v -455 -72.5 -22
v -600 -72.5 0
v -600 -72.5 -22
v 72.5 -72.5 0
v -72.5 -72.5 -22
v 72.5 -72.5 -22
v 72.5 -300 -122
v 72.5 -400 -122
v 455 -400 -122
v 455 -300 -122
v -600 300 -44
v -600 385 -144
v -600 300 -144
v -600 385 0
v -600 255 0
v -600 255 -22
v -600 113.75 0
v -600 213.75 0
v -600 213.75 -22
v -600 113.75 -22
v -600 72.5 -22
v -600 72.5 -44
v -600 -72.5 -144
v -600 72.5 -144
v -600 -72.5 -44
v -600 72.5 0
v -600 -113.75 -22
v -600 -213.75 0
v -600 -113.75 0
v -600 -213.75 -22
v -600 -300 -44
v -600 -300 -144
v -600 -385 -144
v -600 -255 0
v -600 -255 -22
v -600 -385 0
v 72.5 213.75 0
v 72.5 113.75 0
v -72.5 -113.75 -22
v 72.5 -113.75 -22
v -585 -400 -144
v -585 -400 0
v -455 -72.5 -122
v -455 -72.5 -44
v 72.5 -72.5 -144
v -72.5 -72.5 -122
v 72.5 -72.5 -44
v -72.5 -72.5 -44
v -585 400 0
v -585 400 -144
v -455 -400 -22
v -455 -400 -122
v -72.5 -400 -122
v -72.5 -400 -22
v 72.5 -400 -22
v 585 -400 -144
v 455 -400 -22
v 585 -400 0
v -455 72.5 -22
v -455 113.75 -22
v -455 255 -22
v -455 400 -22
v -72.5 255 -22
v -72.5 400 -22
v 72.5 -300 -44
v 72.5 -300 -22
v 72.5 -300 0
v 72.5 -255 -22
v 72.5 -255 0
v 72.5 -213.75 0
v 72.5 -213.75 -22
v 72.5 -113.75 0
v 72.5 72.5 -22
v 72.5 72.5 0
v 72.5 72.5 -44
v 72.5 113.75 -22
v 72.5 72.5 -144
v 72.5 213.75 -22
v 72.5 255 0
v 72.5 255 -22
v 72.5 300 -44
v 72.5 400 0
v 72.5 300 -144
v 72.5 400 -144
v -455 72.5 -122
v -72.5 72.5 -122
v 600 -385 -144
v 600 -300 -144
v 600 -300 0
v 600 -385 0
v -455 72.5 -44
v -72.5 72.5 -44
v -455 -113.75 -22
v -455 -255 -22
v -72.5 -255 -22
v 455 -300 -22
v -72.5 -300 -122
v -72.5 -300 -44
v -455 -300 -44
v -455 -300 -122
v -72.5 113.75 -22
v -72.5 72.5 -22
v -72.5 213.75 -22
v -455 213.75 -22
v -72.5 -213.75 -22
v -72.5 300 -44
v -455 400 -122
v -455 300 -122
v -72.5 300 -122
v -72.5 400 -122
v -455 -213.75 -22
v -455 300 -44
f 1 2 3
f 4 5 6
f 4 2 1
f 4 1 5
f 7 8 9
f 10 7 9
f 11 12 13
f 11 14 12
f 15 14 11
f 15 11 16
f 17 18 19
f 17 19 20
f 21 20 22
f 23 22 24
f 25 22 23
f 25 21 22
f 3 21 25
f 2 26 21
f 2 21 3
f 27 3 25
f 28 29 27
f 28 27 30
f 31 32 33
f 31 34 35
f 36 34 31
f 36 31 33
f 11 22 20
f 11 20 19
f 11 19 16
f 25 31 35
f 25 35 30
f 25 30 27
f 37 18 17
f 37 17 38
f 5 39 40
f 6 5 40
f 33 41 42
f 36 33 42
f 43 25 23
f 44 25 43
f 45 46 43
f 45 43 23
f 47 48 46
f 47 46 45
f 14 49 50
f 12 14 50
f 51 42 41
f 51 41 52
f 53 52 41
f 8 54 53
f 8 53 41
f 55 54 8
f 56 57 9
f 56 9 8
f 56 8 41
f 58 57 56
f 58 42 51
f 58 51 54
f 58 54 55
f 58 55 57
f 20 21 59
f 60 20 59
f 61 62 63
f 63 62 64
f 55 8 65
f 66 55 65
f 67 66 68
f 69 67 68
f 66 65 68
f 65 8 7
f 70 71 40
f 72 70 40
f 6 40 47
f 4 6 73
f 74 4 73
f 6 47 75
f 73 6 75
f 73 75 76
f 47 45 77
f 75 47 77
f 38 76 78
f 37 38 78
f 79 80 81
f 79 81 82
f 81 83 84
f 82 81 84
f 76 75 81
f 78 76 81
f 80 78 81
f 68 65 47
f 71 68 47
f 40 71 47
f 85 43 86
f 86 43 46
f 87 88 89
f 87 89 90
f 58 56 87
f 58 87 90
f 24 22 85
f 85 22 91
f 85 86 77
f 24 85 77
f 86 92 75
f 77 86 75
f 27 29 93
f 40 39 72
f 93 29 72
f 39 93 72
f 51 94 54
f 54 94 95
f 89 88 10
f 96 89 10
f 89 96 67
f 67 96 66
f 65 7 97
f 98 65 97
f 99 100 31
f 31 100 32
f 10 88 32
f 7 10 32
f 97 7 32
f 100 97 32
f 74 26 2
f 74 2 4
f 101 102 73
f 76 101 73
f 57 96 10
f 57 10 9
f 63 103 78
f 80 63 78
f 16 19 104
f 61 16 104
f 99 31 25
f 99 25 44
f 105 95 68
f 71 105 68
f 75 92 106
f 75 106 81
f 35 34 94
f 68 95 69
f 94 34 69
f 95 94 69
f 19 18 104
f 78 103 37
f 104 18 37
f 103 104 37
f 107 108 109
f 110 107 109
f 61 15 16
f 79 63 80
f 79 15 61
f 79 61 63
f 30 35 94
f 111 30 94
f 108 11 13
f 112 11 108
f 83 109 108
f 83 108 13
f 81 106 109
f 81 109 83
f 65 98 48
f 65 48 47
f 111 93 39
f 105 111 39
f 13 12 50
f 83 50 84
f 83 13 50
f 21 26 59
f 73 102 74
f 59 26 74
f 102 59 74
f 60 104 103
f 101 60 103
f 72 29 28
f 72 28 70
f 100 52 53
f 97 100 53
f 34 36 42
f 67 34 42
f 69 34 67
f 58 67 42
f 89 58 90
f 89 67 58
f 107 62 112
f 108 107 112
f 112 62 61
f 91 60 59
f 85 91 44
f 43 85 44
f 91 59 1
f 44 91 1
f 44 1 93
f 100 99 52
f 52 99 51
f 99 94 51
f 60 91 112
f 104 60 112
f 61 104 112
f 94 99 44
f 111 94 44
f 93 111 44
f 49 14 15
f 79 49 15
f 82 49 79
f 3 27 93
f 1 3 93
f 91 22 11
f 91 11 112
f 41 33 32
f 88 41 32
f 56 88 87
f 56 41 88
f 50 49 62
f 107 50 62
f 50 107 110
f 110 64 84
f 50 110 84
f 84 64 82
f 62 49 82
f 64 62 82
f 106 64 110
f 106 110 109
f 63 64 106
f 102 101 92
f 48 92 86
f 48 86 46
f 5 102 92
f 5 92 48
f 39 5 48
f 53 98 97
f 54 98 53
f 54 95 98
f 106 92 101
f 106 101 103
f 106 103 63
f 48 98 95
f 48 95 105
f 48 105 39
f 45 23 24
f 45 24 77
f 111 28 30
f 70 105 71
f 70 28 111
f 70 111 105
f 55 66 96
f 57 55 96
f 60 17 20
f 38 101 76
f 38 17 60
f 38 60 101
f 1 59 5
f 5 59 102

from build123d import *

# Parameters (mm, degrees)
F0_W      = 1200
F0_H      = 145
F1_DEPTH  = 22
F0_H_2    = 100
F2_W      = 145
F2_H      = 655
F2_H_2    = 145
F3_DEPTH  = 22
F4_W      = 145
F4_H      = 100
F6_DEPTH  = 78
F4_H_2    = 145
F5_W      = 145
F5_H      = 145
F5_H_2    = 100
F7_W      = 145
F7_H      = 100
F7_W_2    = 1055
F8_DEPTH  = 22
F7_W_3    = 1200
F7_H_2    = 145
F10_SIZE  = 15
F11_W     = 527.5
F11_H     = 145
F12_DEPTH = 211


# Not quite as in the source:
# - a feature names something its author has since deleted; it is built from what else it names


with BuildPart() as f1:
    # F0 (on Top) → F1 (new body)
    with BuildSketch(Plane.XY):
        with Locations((0, 327.5)):
            Rectangle(F0_W, F0_H)
    extrude(amount=-F1_DEPTH)


with BuildPart() as f1b:
    # F0 (on Top) → F1, piece 2 (new body)
    with BuildSketch(Plane.XY):
        with Locations((0, 163.75)):
            Rectangle(F0_W, F0_H_2)
    extrude(amount=-F1_DEPTH)


with BuildPart() as f1c:
    # F0 (on Top) → F1, piece 3 (new body)
    with BuildSketch(Plane.XY):
        Rectangle(F0_W, F0_H)
    extrude(amount=-F1_DEPTH)


with BuildPart() as f1d:
    # F0 (on Top) → F1, piece 4 (new body)
    with BuildSketch(Plane.XY):
        with Locations((0, -163.75)):
            Rectangle(F0_W, F0_H_2)
    extrude(amount=-F1_DEPTH)


with BuildPart() as f1e:
    # F0 (on Top) → F1, piece 5 (new body)
    with BuildSketch(Plane.XY):
        with Locations((0, -327.5)):
            Rectangle(F0_W, F0_H)
    extrude(amount=-F1_DEPTH)


with BuildPart() as f3:
    # F2 (on face) → F3 (new body)
    with BuildSketch(Plane(origin=(0, 0, -22), x_dir=(1, 0, 0), z_dir=(0, 0, -1))):
        with Locations((-527.5, -72.5)):
            Rectangle(F2_W, F2_H)
        with Locations((-527.5, 327.5)):
            Rectangle(F2_W, F2_H_2)
    extrude(amount=F3_DEPTH)


with BuildPart() as f3b:
    # F2 (on face) → F3, piece 2 (new body)
    with BuildSketch(Plane(origin=(0, 0, -22), x_dir=(1, 0, 0), z_dir=(0, 0, -1))):
        with Locations((0, 327.5)):
            Rectangle(F2_W, F2_H_2)
        with Locations((0, -72.5)):
            Rectangle(F2_W, F2_H)
    extrude(amount=F3_DEPTH)


with BuildPart() as f3c:
    # F2 (on face) → F3, piece 3 (new body)
    with BuildSketch(Plane(origin=(0, 0, -22), x_dir=(1, 0, 0), z_dir=(0, 0, -1))):
        with Locations((527.5, 327.5)):
            Rectangle(F2_W, F2_H_2)
        with Locations((527.5, -72.5)):
            Rectangle(F2_W, F2_H)
    extrude(amount=F3_DEPTH)


with BuildPart() as f6:
    # F4 (on face) → F6 (new body)
    with BuildSketch(Plane(origin=(0, 0, -44), x_dir=(1, 0, 0), z_dir=(0, 0, -1))):
        with Locations((-527.5, -350)):
            Rectangle(F4_W, F4_H)
    extrude(amount=F6_DEPTH)


with BuildPart() as f6b:
    # F4 (on face) → F6, piece 2 (new body)
    with BuildSketch(Plane(origin=(0, 0, -44), x_dir=(1, 0, 0), z_dir=(0, 0, -1))):
        with Locations((-527.5, 350)):
            Rectangle(F4_W, F4_H)
    extrude(amount=F6_DEPTH)


with BuildPart() as f6c:
    # F4 (on face) → F6, piece 3 (new body)
    with BuildSketch(Plane(origin=(0, 0, -44), x_dir=(1, 0, 0), z_dir=(0, 0, -1))):
        with Locations((527.5, -350)):
            Rectangle(F4_W, F4_H)
    extrude(amount=F6_DEPTH)


with BuildPart() as f6d:
    # F4 (on face) → F6, piece 4 (new body)
    with BuildSketch(Plane(origin=(0, 0, -44), x_dir=(1, 0, 0), z_dir=(0, 0, -1))):
        with Locations((527.5, 0)):
            Rectangle(F4_W, F4_H_2)
    extrude(amount=F6_DEPTH)


with BuildPart() as f6e:
    # F4 (on face) → F6, piece 5 (new body)
    with BuildSketch(Plane(origin=(0, 0, -44), x_dir=(1, 0, 0), z_dir=(0, 0, -1))):
        with Locations((527.5, 350)):
            Rectangle(F4_W, F4_H)
    extrude(amount=F6_DEPTH)


with BuildPart() as f6f:
    # F4 (on face) → F6, piece 6 (new body)
    with BuildSketch(Plane(origin=(0, 0, -44), x_dir=(1, 0, 0), z_dir=(0, 0, -1))):
        with Locations((-527.5, 0)):
            Rectangle(F4_W, F4_H_2)
    extrude(amount=F6_DEPTH)


with BuildPart() as f6g:
    # F5 (on face) → F6, piece 7 (new body)
    with BuildSketch(Plane(origin=(0, 0, -44), x_dir=(1, 0, 0), z_dir=(0, 0, -1))):
        Rectangle(F5_W, F5_H)
    extrude(amount=F6_DEPTH)


with BuildPart() as f6h:
    # F5 (on face) → F6, piece 8 (new body)
    with BuildSketch(Plane(origin=(0, 0, -44), x_dir=(1, 0, 0), z_dir=(0, 0, -1))):
        with Locations((0, 350)):
            Rectangle(F5_W, F5_H_2)
    extrude(amount=F6_DEPTH)


with BuildPart() as f6i:
    # F5 (on face) → F6, piece 9 (new body)
    with BuildSketch(Plane(origin=(0, 0, -44), x_dir=(1, 0, 0), z_dir=(0, 0, -1))):
        with Locations((0, -350)):
            Rectangle(F5_W, F5_H_2)
    extrude(amount=F6_DEPTH)


with BuildPart() as f8:
    # F7 (on face) → F8 (new body)
    with BuildSketch(Plane(origin=(0, 0, -122), x_dir=(1, 0, 0), z_dir=(0, 0, -1))):
        with Locations((-527.5, -350)):
            Rectangle(F7_W, F7_H)
        with Locations((72.5, -350)):
            Rectangle(F7_W_2, F7_H)
    extrude(amount=F8_DEPTH)


with BuildPart() as f8b:
    # F7 (on face) → F8, piece 2 (new body)
    with BuildSketch(Plane(origin=(0, 0, -122), x_dir=(1, 0, 0), z_dir=(0, 0, -1))):
        Rectangle(F7_W_3, F7_H_2)
    extrude(amount=F8_DEPTH)


with BuildPart() as f8c:
    # F7 (on face) → F8, piece 3 (new body)
    with BuildSketch(Plane(origin=(0, 0, -122), x_dir=(1, 0, 0), z_dir=(0, 0, -1))):
        with Locations((0, 350)):
            Rectangle(F7_W_3, F7_H)
    extrude(amount=F8_DEPTH)


with BuildPart() as f3c_1:
    add(f3c.part)

    # F9: union F3b, F3, F1, F1b, F1e, F1d, F1c, F6, F6b, F6d, F6f, F8b, F8c, F6e, F6c, F8, F6i, F6g, F6h
    add(f3b.part)
    add(f3.part)
    add(f1.part)
    add(f1b.part)
    add(f1e.part)
    add(f1d.part)
    add(f1c.part)
    add(f6.part)
    add(f6b.part)
    add(f6d.part)
    add(f6f.part)
    add(f8b.part)
    add(f8c.part)
    add(f6e.part)
    add(f6c.part)
    add(f8.part)
    add(f6i.part)
    add(f6g.part)
    add(f6h.part)

    # F10
    f10_edges = [f3c_1.edges().sort_by_distance(p)[0] for p in [
        (-600, -400, -72),
        (600, -400, -72),
        (600, 400, -72),
        (-600, 400, -72),
    ]]
    chamfer(f10_edges, length=F10_SIZE)

    # F11 (on face) → F12 (cut)
    with BuildSketch(Plane(origin=(0, 0, -144), x_dir=(1, 0, 0), z_dir=(0, 0, -1))):
        with Locations((336.25, 0)):
            Rectangle(F11_W, F11_H)
        Polygon((672.5, -500), (672.5, 300), (72.5, 300), (72.5, 72.5), (600, 72.5), (600, -72.5), (72.5, -72.5), (72.5, -500), align=None)
    extrude(amount=-F12_DEPTH, mode=Mode.SUBTRACT)


solid = f3c_1.part
